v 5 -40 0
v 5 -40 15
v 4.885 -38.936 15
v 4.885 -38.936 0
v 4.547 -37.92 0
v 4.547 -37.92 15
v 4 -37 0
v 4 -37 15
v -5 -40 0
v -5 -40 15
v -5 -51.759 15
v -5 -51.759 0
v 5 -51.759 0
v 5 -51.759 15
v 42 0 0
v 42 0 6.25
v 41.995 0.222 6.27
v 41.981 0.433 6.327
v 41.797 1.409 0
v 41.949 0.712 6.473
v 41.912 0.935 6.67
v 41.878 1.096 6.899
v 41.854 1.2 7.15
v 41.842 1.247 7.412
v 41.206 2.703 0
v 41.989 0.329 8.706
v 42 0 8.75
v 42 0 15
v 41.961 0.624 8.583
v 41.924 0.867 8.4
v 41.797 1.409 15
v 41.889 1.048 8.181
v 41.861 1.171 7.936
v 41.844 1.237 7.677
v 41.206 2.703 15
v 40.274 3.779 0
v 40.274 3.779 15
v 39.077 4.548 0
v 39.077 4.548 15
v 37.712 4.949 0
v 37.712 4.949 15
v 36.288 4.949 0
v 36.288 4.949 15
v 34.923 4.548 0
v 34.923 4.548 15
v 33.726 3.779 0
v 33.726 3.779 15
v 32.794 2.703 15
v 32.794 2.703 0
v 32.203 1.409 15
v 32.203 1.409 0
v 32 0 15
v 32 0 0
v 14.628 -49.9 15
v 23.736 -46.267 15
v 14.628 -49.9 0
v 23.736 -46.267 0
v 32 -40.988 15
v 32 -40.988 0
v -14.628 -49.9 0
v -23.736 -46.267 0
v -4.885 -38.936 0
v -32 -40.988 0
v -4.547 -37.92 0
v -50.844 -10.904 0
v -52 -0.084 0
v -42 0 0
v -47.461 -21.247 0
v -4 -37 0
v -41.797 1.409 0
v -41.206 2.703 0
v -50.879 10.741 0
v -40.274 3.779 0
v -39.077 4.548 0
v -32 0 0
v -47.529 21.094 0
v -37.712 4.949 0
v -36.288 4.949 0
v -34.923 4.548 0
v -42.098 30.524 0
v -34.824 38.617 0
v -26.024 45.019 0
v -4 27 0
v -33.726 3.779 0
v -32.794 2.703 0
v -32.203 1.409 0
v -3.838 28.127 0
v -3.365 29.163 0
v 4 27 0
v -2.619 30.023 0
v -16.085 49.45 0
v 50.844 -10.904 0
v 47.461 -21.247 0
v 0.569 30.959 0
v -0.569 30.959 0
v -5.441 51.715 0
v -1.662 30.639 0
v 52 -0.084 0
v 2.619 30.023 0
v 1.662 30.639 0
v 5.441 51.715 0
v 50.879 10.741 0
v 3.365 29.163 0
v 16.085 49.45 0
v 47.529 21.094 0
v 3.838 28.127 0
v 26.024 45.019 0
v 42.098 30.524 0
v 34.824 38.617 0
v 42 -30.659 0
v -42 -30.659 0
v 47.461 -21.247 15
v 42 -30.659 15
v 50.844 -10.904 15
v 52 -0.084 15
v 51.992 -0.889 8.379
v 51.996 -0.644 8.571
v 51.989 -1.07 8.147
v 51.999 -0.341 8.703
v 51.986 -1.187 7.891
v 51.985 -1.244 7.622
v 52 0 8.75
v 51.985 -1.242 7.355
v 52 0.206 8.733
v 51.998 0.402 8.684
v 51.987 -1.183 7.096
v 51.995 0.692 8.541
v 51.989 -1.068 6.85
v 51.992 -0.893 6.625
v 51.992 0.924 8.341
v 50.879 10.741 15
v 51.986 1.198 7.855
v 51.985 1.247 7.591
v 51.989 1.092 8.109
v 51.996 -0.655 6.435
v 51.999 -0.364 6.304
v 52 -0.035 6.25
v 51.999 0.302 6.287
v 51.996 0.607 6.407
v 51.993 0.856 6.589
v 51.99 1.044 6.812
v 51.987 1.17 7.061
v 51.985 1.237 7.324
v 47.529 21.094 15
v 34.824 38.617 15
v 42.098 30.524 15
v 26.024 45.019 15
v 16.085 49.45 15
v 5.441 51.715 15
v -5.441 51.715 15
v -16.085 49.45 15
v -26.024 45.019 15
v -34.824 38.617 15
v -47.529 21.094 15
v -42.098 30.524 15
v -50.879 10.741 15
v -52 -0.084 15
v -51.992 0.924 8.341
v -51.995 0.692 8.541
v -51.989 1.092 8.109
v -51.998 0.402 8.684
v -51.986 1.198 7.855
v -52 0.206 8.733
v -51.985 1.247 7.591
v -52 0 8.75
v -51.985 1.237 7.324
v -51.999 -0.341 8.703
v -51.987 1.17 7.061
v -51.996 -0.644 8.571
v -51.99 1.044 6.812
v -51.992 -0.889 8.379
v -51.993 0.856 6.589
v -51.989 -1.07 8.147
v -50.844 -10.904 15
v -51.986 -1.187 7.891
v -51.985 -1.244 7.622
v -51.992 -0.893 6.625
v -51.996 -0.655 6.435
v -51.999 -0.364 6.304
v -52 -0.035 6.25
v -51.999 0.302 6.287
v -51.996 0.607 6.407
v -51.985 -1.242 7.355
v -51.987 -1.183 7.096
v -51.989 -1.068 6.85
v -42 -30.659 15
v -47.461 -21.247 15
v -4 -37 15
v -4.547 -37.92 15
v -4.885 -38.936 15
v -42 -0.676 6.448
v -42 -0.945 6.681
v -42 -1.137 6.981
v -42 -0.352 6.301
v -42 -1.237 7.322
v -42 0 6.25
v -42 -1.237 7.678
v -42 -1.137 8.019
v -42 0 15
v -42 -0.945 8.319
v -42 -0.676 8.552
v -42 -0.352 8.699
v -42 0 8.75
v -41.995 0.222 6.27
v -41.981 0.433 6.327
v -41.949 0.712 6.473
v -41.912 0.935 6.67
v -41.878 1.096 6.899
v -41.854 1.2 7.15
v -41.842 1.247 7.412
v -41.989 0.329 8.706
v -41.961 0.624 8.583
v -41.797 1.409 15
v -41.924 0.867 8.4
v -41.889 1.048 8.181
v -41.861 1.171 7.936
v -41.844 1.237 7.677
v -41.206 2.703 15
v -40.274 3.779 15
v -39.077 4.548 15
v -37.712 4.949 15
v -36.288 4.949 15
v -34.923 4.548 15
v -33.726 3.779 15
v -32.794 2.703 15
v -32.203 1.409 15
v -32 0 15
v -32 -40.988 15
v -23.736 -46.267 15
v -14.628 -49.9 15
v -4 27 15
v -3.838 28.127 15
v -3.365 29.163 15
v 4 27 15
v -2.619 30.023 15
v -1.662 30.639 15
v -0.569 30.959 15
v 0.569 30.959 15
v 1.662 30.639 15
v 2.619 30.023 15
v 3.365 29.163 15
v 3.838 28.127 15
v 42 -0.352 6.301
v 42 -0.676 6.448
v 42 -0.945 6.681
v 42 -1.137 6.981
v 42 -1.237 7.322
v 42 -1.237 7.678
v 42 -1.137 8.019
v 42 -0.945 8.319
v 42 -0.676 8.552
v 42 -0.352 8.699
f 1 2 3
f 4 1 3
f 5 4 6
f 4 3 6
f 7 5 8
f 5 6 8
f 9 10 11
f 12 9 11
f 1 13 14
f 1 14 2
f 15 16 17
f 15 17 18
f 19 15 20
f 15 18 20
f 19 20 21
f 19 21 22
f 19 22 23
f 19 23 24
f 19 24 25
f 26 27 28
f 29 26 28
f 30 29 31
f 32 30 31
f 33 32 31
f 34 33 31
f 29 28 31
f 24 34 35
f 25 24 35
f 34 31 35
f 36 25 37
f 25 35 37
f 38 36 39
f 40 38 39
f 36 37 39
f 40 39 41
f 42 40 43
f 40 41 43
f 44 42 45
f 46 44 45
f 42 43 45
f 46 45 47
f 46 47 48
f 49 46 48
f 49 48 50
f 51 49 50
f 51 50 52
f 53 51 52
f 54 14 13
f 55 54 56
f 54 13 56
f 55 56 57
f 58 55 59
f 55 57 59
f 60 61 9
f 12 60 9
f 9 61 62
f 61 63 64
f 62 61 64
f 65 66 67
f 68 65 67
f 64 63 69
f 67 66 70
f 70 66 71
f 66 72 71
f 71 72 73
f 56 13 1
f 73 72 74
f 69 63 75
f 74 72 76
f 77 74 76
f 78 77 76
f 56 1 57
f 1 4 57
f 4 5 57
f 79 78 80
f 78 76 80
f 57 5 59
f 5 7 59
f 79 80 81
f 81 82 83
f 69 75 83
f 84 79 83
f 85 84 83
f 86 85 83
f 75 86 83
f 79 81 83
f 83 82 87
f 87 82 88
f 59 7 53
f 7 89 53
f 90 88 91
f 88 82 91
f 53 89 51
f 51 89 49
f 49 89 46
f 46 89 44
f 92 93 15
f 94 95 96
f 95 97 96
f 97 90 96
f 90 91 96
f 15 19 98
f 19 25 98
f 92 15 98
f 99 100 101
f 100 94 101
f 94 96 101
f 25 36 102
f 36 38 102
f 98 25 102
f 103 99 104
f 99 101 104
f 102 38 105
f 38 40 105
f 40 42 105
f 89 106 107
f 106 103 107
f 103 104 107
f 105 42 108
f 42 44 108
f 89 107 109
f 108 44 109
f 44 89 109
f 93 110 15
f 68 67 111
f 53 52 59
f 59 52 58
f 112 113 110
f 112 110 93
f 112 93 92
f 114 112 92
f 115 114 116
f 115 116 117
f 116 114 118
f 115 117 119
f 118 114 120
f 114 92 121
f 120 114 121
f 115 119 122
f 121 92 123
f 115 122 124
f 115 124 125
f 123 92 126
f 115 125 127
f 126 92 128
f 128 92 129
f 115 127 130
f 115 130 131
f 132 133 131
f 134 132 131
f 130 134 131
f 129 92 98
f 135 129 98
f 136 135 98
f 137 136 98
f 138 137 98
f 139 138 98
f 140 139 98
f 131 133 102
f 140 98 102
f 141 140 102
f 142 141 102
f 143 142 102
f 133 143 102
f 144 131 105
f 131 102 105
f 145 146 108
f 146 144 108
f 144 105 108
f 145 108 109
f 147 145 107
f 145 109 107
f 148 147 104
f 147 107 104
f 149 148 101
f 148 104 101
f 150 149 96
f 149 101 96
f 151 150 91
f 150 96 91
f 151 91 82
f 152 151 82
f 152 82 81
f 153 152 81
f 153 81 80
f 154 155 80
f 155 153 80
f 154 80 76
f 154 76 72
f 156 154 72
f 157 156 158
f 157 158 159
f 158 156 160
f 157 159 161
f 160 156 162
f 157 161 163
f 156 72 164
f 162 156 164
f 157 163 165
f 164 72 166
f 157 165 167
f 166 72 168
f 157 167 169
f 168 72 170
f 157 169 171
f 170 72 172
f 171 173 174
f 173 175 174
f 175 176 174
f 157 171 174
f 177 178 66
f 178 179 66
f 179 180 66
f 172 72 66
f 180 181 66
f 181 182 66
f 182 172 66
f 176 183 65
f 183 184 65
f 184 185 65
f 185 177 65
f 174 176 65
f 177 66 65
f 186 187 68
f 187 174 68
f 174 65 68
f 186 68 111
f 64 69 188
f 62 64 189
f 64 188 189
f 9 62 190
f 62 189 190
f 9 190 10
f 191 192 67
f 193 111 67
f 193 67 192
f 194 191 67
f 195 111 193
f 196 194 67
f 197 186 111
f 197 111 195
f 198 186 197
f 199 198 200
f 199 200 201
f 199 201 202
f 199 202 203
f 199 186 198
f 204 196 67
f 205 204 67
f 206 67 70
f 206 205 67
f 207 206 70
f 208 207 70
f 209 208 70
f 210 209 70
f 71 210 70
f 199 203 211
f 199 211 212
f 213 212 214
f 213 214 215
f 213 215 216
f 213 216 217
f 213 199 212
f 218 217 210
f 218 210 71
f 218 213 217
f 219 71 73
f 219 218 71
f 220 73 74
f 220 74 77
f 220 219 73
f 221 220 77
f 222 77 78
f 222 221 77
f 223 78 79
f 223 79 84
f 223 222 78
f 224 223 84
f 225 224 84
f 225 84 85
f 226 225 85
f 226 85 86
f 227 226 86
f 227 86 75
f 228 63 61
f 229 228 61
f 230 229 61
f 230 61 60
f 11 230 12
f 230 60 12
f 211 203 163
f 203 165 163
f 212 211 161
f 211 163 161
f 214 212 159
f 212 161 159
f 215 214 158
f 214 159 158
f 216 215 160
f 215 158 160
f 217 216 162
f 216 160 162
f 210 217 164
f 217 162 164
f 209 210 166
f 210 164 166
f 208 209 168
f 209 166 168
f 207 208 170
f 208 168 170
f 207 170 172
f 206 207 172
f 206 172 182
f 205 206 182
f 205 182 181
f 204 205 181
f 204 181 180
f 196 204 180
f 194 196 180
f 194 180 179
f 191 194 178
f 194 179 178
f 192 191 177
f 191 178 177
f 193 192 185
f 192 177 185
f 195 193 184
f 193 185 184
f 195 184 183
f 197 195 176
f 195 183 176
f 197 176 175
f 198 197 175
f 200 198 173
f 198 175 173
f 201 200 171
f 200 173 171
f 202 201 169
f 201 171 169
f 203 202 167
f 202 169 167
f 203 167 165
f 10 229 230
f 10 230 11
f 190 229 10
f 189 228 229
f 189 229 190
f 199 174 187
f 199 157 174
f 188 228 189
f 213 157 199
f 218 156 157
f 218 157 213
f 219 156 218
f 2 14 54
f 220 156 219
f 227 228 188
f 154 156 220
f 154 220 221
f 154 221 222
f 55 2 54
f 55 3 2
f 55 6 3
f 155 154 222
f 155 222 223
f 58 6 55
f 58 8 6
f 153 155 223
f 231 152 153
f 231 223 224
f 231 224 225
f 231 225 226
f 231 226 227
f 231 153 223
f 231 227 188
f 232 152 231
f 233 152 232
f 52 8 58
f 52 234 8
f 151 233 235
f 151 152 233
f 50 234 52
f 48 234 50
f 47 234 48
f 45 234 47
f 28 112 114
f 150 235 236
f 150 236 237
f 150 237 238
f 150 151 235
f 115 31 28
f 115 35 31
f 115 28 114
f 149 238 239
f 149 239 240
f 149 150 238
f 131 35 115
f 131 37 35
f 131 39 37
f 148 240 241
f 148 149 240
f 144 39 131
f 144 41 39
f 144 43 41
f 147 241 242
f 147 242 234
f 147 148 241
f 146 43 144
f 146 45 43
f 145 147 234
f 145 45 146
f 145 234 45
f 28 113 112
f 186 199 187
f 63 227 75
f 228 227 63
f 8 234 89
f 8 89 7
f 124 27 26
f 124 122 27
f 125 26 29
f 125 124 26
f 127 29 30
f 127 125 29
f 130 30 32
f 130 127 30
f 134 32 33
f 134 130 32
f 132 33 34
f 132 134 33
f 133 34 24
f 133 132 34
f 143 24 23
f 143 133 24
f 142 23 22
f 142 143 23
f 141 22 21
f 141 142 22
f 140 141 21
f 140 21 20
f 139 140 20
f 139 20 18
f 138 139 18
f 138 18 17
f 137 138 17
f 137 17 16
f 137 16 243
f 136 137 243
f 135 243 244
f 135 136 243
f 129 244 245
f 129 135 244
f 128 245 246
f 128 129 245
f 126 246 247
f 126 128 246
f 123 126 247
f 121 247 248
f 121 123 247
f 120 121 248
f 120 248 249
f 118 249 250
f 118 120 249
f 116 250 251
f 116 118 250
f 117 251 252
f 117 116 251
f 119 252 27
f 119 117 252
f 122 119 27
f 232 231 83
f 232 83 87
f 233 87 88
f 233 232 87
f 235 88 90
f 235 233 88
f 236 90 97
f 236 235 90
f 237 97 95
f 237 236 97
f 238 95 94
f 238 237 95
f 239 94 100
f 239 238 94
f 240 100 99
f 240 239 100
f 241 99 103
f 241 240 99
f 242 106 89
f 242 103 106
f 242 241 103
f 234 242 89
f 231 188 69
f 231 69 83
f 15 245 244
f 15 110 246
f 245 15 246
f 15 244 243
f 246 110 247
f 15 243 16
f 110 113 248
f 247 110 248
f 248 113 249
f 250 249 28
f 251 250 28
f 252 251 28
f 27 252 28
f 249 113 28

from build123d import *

# Parameters (mm, degrees)
SKETCH1_R              = 52
BOSS_EXTRUDE1_DEPTH    = 15
CUT_EXTRUDE1_DEPTH     = 15
CUT_EXTRUDE2_DEPTH     = 30
M3_TAPPED_HOLE1_REACH  = 119.239
M3_TAPPED_HOLE1_BORE_R = 1.25


with BuildPart() as part:
    # Sketch1 → Boss-Extrude1 (new body)
    with BuildSketch(Plane.XY):
        Circle(SKETCH1_R)
    extrude(amount=BOSS_EXTRUDE1_DEPTH)

    # Sketch2 → Cut-Extrude1 (cut)
    with BuildSketch(Plane.XY.offset(15)):
        with BuildLine():
            Line((32, 0), (32, -45))
            Line((32, -45), (42, -45))
            Line((42, -45), (42, 3.54e-07))
            ThreePointArc((42, 3.54e-07), (36.999999823, 5), (32, 0))
        make_face()
        with BuildLine():
            Line((-5, -39.999999646), (-5, -55))
            Line((-5, -55), (5, -55))
            Line((5, -55), (5, -40))
            ThreePointArc((5, -40), (1.77e-07, -35), (-5, -39.999999646))
        make_face()
        with BuildLine():
            Line((-32, -45), (-42, -45))
            Line((-42, -45), (-42, 3.54e-07))
            ThreePointArc((-42, 3.54e-07), (-36.999999823, 5), (-32, 0))
            Line((-32, 0), (-32, -45))
        make_face()
    extrude(amount=-CUT_EXTRUDE1_DEPTH, mode=Mode.SUBTRACT)

    # Sketch3 → Cut-Extrude2 (cut)
    with BuildSketch(Plane.XY.offset(15)):
        with BuildLine():
            Line((4, 27.000000608), (4, -40))
            Line((4, -40), (-4, -40))
            Line((-4, -40), (-4, 27))
            ThreePointArc((-4, 27), (-3.04e-07, 31), (4, 27.000000608))
        make_face()
    extrude(amount=-CUT_EXTRUDE2_DEPTH, mode=Mode.SUBTRACT)

    # M3 Tapped Hole1 bore → M3 Tapped Hole1 (cut, up to next)
    with BuildSketch(Plane.ZY.offset(52), mode=Mode.PRIVATE) as m3_tapped_hole1_sk1:
        with Locations((7.5, 4.2e-08)):
            Circle(M3_TAPPED_HOLE1_BORE_R)
    m3_tapped_hole1_tool1 = extrude(m3_tapped_hole1_sk1.sketch, amount=-M3_TAPPED_HOLE1_REACH, mode=Mode.PRIVATE) & part.part
    m3_tapped_hole1 = m3_tapped_hole1_tool1.solids().sort_by_distance((-52, 0, 7.5))[0]
    add(m3_tapped_hole1, mode=Mode.SUBTRACT)

    # Mirror1: M3 Tapped Hole1 across plane
    add(m3_tapped_hole1.mirror(Plane(origin=(0, 0, 0), x_dir=(0, 0, 1), z_dir=(1, 0, 0))), mode=Mode.SUBTRACT)


solid = part.part
